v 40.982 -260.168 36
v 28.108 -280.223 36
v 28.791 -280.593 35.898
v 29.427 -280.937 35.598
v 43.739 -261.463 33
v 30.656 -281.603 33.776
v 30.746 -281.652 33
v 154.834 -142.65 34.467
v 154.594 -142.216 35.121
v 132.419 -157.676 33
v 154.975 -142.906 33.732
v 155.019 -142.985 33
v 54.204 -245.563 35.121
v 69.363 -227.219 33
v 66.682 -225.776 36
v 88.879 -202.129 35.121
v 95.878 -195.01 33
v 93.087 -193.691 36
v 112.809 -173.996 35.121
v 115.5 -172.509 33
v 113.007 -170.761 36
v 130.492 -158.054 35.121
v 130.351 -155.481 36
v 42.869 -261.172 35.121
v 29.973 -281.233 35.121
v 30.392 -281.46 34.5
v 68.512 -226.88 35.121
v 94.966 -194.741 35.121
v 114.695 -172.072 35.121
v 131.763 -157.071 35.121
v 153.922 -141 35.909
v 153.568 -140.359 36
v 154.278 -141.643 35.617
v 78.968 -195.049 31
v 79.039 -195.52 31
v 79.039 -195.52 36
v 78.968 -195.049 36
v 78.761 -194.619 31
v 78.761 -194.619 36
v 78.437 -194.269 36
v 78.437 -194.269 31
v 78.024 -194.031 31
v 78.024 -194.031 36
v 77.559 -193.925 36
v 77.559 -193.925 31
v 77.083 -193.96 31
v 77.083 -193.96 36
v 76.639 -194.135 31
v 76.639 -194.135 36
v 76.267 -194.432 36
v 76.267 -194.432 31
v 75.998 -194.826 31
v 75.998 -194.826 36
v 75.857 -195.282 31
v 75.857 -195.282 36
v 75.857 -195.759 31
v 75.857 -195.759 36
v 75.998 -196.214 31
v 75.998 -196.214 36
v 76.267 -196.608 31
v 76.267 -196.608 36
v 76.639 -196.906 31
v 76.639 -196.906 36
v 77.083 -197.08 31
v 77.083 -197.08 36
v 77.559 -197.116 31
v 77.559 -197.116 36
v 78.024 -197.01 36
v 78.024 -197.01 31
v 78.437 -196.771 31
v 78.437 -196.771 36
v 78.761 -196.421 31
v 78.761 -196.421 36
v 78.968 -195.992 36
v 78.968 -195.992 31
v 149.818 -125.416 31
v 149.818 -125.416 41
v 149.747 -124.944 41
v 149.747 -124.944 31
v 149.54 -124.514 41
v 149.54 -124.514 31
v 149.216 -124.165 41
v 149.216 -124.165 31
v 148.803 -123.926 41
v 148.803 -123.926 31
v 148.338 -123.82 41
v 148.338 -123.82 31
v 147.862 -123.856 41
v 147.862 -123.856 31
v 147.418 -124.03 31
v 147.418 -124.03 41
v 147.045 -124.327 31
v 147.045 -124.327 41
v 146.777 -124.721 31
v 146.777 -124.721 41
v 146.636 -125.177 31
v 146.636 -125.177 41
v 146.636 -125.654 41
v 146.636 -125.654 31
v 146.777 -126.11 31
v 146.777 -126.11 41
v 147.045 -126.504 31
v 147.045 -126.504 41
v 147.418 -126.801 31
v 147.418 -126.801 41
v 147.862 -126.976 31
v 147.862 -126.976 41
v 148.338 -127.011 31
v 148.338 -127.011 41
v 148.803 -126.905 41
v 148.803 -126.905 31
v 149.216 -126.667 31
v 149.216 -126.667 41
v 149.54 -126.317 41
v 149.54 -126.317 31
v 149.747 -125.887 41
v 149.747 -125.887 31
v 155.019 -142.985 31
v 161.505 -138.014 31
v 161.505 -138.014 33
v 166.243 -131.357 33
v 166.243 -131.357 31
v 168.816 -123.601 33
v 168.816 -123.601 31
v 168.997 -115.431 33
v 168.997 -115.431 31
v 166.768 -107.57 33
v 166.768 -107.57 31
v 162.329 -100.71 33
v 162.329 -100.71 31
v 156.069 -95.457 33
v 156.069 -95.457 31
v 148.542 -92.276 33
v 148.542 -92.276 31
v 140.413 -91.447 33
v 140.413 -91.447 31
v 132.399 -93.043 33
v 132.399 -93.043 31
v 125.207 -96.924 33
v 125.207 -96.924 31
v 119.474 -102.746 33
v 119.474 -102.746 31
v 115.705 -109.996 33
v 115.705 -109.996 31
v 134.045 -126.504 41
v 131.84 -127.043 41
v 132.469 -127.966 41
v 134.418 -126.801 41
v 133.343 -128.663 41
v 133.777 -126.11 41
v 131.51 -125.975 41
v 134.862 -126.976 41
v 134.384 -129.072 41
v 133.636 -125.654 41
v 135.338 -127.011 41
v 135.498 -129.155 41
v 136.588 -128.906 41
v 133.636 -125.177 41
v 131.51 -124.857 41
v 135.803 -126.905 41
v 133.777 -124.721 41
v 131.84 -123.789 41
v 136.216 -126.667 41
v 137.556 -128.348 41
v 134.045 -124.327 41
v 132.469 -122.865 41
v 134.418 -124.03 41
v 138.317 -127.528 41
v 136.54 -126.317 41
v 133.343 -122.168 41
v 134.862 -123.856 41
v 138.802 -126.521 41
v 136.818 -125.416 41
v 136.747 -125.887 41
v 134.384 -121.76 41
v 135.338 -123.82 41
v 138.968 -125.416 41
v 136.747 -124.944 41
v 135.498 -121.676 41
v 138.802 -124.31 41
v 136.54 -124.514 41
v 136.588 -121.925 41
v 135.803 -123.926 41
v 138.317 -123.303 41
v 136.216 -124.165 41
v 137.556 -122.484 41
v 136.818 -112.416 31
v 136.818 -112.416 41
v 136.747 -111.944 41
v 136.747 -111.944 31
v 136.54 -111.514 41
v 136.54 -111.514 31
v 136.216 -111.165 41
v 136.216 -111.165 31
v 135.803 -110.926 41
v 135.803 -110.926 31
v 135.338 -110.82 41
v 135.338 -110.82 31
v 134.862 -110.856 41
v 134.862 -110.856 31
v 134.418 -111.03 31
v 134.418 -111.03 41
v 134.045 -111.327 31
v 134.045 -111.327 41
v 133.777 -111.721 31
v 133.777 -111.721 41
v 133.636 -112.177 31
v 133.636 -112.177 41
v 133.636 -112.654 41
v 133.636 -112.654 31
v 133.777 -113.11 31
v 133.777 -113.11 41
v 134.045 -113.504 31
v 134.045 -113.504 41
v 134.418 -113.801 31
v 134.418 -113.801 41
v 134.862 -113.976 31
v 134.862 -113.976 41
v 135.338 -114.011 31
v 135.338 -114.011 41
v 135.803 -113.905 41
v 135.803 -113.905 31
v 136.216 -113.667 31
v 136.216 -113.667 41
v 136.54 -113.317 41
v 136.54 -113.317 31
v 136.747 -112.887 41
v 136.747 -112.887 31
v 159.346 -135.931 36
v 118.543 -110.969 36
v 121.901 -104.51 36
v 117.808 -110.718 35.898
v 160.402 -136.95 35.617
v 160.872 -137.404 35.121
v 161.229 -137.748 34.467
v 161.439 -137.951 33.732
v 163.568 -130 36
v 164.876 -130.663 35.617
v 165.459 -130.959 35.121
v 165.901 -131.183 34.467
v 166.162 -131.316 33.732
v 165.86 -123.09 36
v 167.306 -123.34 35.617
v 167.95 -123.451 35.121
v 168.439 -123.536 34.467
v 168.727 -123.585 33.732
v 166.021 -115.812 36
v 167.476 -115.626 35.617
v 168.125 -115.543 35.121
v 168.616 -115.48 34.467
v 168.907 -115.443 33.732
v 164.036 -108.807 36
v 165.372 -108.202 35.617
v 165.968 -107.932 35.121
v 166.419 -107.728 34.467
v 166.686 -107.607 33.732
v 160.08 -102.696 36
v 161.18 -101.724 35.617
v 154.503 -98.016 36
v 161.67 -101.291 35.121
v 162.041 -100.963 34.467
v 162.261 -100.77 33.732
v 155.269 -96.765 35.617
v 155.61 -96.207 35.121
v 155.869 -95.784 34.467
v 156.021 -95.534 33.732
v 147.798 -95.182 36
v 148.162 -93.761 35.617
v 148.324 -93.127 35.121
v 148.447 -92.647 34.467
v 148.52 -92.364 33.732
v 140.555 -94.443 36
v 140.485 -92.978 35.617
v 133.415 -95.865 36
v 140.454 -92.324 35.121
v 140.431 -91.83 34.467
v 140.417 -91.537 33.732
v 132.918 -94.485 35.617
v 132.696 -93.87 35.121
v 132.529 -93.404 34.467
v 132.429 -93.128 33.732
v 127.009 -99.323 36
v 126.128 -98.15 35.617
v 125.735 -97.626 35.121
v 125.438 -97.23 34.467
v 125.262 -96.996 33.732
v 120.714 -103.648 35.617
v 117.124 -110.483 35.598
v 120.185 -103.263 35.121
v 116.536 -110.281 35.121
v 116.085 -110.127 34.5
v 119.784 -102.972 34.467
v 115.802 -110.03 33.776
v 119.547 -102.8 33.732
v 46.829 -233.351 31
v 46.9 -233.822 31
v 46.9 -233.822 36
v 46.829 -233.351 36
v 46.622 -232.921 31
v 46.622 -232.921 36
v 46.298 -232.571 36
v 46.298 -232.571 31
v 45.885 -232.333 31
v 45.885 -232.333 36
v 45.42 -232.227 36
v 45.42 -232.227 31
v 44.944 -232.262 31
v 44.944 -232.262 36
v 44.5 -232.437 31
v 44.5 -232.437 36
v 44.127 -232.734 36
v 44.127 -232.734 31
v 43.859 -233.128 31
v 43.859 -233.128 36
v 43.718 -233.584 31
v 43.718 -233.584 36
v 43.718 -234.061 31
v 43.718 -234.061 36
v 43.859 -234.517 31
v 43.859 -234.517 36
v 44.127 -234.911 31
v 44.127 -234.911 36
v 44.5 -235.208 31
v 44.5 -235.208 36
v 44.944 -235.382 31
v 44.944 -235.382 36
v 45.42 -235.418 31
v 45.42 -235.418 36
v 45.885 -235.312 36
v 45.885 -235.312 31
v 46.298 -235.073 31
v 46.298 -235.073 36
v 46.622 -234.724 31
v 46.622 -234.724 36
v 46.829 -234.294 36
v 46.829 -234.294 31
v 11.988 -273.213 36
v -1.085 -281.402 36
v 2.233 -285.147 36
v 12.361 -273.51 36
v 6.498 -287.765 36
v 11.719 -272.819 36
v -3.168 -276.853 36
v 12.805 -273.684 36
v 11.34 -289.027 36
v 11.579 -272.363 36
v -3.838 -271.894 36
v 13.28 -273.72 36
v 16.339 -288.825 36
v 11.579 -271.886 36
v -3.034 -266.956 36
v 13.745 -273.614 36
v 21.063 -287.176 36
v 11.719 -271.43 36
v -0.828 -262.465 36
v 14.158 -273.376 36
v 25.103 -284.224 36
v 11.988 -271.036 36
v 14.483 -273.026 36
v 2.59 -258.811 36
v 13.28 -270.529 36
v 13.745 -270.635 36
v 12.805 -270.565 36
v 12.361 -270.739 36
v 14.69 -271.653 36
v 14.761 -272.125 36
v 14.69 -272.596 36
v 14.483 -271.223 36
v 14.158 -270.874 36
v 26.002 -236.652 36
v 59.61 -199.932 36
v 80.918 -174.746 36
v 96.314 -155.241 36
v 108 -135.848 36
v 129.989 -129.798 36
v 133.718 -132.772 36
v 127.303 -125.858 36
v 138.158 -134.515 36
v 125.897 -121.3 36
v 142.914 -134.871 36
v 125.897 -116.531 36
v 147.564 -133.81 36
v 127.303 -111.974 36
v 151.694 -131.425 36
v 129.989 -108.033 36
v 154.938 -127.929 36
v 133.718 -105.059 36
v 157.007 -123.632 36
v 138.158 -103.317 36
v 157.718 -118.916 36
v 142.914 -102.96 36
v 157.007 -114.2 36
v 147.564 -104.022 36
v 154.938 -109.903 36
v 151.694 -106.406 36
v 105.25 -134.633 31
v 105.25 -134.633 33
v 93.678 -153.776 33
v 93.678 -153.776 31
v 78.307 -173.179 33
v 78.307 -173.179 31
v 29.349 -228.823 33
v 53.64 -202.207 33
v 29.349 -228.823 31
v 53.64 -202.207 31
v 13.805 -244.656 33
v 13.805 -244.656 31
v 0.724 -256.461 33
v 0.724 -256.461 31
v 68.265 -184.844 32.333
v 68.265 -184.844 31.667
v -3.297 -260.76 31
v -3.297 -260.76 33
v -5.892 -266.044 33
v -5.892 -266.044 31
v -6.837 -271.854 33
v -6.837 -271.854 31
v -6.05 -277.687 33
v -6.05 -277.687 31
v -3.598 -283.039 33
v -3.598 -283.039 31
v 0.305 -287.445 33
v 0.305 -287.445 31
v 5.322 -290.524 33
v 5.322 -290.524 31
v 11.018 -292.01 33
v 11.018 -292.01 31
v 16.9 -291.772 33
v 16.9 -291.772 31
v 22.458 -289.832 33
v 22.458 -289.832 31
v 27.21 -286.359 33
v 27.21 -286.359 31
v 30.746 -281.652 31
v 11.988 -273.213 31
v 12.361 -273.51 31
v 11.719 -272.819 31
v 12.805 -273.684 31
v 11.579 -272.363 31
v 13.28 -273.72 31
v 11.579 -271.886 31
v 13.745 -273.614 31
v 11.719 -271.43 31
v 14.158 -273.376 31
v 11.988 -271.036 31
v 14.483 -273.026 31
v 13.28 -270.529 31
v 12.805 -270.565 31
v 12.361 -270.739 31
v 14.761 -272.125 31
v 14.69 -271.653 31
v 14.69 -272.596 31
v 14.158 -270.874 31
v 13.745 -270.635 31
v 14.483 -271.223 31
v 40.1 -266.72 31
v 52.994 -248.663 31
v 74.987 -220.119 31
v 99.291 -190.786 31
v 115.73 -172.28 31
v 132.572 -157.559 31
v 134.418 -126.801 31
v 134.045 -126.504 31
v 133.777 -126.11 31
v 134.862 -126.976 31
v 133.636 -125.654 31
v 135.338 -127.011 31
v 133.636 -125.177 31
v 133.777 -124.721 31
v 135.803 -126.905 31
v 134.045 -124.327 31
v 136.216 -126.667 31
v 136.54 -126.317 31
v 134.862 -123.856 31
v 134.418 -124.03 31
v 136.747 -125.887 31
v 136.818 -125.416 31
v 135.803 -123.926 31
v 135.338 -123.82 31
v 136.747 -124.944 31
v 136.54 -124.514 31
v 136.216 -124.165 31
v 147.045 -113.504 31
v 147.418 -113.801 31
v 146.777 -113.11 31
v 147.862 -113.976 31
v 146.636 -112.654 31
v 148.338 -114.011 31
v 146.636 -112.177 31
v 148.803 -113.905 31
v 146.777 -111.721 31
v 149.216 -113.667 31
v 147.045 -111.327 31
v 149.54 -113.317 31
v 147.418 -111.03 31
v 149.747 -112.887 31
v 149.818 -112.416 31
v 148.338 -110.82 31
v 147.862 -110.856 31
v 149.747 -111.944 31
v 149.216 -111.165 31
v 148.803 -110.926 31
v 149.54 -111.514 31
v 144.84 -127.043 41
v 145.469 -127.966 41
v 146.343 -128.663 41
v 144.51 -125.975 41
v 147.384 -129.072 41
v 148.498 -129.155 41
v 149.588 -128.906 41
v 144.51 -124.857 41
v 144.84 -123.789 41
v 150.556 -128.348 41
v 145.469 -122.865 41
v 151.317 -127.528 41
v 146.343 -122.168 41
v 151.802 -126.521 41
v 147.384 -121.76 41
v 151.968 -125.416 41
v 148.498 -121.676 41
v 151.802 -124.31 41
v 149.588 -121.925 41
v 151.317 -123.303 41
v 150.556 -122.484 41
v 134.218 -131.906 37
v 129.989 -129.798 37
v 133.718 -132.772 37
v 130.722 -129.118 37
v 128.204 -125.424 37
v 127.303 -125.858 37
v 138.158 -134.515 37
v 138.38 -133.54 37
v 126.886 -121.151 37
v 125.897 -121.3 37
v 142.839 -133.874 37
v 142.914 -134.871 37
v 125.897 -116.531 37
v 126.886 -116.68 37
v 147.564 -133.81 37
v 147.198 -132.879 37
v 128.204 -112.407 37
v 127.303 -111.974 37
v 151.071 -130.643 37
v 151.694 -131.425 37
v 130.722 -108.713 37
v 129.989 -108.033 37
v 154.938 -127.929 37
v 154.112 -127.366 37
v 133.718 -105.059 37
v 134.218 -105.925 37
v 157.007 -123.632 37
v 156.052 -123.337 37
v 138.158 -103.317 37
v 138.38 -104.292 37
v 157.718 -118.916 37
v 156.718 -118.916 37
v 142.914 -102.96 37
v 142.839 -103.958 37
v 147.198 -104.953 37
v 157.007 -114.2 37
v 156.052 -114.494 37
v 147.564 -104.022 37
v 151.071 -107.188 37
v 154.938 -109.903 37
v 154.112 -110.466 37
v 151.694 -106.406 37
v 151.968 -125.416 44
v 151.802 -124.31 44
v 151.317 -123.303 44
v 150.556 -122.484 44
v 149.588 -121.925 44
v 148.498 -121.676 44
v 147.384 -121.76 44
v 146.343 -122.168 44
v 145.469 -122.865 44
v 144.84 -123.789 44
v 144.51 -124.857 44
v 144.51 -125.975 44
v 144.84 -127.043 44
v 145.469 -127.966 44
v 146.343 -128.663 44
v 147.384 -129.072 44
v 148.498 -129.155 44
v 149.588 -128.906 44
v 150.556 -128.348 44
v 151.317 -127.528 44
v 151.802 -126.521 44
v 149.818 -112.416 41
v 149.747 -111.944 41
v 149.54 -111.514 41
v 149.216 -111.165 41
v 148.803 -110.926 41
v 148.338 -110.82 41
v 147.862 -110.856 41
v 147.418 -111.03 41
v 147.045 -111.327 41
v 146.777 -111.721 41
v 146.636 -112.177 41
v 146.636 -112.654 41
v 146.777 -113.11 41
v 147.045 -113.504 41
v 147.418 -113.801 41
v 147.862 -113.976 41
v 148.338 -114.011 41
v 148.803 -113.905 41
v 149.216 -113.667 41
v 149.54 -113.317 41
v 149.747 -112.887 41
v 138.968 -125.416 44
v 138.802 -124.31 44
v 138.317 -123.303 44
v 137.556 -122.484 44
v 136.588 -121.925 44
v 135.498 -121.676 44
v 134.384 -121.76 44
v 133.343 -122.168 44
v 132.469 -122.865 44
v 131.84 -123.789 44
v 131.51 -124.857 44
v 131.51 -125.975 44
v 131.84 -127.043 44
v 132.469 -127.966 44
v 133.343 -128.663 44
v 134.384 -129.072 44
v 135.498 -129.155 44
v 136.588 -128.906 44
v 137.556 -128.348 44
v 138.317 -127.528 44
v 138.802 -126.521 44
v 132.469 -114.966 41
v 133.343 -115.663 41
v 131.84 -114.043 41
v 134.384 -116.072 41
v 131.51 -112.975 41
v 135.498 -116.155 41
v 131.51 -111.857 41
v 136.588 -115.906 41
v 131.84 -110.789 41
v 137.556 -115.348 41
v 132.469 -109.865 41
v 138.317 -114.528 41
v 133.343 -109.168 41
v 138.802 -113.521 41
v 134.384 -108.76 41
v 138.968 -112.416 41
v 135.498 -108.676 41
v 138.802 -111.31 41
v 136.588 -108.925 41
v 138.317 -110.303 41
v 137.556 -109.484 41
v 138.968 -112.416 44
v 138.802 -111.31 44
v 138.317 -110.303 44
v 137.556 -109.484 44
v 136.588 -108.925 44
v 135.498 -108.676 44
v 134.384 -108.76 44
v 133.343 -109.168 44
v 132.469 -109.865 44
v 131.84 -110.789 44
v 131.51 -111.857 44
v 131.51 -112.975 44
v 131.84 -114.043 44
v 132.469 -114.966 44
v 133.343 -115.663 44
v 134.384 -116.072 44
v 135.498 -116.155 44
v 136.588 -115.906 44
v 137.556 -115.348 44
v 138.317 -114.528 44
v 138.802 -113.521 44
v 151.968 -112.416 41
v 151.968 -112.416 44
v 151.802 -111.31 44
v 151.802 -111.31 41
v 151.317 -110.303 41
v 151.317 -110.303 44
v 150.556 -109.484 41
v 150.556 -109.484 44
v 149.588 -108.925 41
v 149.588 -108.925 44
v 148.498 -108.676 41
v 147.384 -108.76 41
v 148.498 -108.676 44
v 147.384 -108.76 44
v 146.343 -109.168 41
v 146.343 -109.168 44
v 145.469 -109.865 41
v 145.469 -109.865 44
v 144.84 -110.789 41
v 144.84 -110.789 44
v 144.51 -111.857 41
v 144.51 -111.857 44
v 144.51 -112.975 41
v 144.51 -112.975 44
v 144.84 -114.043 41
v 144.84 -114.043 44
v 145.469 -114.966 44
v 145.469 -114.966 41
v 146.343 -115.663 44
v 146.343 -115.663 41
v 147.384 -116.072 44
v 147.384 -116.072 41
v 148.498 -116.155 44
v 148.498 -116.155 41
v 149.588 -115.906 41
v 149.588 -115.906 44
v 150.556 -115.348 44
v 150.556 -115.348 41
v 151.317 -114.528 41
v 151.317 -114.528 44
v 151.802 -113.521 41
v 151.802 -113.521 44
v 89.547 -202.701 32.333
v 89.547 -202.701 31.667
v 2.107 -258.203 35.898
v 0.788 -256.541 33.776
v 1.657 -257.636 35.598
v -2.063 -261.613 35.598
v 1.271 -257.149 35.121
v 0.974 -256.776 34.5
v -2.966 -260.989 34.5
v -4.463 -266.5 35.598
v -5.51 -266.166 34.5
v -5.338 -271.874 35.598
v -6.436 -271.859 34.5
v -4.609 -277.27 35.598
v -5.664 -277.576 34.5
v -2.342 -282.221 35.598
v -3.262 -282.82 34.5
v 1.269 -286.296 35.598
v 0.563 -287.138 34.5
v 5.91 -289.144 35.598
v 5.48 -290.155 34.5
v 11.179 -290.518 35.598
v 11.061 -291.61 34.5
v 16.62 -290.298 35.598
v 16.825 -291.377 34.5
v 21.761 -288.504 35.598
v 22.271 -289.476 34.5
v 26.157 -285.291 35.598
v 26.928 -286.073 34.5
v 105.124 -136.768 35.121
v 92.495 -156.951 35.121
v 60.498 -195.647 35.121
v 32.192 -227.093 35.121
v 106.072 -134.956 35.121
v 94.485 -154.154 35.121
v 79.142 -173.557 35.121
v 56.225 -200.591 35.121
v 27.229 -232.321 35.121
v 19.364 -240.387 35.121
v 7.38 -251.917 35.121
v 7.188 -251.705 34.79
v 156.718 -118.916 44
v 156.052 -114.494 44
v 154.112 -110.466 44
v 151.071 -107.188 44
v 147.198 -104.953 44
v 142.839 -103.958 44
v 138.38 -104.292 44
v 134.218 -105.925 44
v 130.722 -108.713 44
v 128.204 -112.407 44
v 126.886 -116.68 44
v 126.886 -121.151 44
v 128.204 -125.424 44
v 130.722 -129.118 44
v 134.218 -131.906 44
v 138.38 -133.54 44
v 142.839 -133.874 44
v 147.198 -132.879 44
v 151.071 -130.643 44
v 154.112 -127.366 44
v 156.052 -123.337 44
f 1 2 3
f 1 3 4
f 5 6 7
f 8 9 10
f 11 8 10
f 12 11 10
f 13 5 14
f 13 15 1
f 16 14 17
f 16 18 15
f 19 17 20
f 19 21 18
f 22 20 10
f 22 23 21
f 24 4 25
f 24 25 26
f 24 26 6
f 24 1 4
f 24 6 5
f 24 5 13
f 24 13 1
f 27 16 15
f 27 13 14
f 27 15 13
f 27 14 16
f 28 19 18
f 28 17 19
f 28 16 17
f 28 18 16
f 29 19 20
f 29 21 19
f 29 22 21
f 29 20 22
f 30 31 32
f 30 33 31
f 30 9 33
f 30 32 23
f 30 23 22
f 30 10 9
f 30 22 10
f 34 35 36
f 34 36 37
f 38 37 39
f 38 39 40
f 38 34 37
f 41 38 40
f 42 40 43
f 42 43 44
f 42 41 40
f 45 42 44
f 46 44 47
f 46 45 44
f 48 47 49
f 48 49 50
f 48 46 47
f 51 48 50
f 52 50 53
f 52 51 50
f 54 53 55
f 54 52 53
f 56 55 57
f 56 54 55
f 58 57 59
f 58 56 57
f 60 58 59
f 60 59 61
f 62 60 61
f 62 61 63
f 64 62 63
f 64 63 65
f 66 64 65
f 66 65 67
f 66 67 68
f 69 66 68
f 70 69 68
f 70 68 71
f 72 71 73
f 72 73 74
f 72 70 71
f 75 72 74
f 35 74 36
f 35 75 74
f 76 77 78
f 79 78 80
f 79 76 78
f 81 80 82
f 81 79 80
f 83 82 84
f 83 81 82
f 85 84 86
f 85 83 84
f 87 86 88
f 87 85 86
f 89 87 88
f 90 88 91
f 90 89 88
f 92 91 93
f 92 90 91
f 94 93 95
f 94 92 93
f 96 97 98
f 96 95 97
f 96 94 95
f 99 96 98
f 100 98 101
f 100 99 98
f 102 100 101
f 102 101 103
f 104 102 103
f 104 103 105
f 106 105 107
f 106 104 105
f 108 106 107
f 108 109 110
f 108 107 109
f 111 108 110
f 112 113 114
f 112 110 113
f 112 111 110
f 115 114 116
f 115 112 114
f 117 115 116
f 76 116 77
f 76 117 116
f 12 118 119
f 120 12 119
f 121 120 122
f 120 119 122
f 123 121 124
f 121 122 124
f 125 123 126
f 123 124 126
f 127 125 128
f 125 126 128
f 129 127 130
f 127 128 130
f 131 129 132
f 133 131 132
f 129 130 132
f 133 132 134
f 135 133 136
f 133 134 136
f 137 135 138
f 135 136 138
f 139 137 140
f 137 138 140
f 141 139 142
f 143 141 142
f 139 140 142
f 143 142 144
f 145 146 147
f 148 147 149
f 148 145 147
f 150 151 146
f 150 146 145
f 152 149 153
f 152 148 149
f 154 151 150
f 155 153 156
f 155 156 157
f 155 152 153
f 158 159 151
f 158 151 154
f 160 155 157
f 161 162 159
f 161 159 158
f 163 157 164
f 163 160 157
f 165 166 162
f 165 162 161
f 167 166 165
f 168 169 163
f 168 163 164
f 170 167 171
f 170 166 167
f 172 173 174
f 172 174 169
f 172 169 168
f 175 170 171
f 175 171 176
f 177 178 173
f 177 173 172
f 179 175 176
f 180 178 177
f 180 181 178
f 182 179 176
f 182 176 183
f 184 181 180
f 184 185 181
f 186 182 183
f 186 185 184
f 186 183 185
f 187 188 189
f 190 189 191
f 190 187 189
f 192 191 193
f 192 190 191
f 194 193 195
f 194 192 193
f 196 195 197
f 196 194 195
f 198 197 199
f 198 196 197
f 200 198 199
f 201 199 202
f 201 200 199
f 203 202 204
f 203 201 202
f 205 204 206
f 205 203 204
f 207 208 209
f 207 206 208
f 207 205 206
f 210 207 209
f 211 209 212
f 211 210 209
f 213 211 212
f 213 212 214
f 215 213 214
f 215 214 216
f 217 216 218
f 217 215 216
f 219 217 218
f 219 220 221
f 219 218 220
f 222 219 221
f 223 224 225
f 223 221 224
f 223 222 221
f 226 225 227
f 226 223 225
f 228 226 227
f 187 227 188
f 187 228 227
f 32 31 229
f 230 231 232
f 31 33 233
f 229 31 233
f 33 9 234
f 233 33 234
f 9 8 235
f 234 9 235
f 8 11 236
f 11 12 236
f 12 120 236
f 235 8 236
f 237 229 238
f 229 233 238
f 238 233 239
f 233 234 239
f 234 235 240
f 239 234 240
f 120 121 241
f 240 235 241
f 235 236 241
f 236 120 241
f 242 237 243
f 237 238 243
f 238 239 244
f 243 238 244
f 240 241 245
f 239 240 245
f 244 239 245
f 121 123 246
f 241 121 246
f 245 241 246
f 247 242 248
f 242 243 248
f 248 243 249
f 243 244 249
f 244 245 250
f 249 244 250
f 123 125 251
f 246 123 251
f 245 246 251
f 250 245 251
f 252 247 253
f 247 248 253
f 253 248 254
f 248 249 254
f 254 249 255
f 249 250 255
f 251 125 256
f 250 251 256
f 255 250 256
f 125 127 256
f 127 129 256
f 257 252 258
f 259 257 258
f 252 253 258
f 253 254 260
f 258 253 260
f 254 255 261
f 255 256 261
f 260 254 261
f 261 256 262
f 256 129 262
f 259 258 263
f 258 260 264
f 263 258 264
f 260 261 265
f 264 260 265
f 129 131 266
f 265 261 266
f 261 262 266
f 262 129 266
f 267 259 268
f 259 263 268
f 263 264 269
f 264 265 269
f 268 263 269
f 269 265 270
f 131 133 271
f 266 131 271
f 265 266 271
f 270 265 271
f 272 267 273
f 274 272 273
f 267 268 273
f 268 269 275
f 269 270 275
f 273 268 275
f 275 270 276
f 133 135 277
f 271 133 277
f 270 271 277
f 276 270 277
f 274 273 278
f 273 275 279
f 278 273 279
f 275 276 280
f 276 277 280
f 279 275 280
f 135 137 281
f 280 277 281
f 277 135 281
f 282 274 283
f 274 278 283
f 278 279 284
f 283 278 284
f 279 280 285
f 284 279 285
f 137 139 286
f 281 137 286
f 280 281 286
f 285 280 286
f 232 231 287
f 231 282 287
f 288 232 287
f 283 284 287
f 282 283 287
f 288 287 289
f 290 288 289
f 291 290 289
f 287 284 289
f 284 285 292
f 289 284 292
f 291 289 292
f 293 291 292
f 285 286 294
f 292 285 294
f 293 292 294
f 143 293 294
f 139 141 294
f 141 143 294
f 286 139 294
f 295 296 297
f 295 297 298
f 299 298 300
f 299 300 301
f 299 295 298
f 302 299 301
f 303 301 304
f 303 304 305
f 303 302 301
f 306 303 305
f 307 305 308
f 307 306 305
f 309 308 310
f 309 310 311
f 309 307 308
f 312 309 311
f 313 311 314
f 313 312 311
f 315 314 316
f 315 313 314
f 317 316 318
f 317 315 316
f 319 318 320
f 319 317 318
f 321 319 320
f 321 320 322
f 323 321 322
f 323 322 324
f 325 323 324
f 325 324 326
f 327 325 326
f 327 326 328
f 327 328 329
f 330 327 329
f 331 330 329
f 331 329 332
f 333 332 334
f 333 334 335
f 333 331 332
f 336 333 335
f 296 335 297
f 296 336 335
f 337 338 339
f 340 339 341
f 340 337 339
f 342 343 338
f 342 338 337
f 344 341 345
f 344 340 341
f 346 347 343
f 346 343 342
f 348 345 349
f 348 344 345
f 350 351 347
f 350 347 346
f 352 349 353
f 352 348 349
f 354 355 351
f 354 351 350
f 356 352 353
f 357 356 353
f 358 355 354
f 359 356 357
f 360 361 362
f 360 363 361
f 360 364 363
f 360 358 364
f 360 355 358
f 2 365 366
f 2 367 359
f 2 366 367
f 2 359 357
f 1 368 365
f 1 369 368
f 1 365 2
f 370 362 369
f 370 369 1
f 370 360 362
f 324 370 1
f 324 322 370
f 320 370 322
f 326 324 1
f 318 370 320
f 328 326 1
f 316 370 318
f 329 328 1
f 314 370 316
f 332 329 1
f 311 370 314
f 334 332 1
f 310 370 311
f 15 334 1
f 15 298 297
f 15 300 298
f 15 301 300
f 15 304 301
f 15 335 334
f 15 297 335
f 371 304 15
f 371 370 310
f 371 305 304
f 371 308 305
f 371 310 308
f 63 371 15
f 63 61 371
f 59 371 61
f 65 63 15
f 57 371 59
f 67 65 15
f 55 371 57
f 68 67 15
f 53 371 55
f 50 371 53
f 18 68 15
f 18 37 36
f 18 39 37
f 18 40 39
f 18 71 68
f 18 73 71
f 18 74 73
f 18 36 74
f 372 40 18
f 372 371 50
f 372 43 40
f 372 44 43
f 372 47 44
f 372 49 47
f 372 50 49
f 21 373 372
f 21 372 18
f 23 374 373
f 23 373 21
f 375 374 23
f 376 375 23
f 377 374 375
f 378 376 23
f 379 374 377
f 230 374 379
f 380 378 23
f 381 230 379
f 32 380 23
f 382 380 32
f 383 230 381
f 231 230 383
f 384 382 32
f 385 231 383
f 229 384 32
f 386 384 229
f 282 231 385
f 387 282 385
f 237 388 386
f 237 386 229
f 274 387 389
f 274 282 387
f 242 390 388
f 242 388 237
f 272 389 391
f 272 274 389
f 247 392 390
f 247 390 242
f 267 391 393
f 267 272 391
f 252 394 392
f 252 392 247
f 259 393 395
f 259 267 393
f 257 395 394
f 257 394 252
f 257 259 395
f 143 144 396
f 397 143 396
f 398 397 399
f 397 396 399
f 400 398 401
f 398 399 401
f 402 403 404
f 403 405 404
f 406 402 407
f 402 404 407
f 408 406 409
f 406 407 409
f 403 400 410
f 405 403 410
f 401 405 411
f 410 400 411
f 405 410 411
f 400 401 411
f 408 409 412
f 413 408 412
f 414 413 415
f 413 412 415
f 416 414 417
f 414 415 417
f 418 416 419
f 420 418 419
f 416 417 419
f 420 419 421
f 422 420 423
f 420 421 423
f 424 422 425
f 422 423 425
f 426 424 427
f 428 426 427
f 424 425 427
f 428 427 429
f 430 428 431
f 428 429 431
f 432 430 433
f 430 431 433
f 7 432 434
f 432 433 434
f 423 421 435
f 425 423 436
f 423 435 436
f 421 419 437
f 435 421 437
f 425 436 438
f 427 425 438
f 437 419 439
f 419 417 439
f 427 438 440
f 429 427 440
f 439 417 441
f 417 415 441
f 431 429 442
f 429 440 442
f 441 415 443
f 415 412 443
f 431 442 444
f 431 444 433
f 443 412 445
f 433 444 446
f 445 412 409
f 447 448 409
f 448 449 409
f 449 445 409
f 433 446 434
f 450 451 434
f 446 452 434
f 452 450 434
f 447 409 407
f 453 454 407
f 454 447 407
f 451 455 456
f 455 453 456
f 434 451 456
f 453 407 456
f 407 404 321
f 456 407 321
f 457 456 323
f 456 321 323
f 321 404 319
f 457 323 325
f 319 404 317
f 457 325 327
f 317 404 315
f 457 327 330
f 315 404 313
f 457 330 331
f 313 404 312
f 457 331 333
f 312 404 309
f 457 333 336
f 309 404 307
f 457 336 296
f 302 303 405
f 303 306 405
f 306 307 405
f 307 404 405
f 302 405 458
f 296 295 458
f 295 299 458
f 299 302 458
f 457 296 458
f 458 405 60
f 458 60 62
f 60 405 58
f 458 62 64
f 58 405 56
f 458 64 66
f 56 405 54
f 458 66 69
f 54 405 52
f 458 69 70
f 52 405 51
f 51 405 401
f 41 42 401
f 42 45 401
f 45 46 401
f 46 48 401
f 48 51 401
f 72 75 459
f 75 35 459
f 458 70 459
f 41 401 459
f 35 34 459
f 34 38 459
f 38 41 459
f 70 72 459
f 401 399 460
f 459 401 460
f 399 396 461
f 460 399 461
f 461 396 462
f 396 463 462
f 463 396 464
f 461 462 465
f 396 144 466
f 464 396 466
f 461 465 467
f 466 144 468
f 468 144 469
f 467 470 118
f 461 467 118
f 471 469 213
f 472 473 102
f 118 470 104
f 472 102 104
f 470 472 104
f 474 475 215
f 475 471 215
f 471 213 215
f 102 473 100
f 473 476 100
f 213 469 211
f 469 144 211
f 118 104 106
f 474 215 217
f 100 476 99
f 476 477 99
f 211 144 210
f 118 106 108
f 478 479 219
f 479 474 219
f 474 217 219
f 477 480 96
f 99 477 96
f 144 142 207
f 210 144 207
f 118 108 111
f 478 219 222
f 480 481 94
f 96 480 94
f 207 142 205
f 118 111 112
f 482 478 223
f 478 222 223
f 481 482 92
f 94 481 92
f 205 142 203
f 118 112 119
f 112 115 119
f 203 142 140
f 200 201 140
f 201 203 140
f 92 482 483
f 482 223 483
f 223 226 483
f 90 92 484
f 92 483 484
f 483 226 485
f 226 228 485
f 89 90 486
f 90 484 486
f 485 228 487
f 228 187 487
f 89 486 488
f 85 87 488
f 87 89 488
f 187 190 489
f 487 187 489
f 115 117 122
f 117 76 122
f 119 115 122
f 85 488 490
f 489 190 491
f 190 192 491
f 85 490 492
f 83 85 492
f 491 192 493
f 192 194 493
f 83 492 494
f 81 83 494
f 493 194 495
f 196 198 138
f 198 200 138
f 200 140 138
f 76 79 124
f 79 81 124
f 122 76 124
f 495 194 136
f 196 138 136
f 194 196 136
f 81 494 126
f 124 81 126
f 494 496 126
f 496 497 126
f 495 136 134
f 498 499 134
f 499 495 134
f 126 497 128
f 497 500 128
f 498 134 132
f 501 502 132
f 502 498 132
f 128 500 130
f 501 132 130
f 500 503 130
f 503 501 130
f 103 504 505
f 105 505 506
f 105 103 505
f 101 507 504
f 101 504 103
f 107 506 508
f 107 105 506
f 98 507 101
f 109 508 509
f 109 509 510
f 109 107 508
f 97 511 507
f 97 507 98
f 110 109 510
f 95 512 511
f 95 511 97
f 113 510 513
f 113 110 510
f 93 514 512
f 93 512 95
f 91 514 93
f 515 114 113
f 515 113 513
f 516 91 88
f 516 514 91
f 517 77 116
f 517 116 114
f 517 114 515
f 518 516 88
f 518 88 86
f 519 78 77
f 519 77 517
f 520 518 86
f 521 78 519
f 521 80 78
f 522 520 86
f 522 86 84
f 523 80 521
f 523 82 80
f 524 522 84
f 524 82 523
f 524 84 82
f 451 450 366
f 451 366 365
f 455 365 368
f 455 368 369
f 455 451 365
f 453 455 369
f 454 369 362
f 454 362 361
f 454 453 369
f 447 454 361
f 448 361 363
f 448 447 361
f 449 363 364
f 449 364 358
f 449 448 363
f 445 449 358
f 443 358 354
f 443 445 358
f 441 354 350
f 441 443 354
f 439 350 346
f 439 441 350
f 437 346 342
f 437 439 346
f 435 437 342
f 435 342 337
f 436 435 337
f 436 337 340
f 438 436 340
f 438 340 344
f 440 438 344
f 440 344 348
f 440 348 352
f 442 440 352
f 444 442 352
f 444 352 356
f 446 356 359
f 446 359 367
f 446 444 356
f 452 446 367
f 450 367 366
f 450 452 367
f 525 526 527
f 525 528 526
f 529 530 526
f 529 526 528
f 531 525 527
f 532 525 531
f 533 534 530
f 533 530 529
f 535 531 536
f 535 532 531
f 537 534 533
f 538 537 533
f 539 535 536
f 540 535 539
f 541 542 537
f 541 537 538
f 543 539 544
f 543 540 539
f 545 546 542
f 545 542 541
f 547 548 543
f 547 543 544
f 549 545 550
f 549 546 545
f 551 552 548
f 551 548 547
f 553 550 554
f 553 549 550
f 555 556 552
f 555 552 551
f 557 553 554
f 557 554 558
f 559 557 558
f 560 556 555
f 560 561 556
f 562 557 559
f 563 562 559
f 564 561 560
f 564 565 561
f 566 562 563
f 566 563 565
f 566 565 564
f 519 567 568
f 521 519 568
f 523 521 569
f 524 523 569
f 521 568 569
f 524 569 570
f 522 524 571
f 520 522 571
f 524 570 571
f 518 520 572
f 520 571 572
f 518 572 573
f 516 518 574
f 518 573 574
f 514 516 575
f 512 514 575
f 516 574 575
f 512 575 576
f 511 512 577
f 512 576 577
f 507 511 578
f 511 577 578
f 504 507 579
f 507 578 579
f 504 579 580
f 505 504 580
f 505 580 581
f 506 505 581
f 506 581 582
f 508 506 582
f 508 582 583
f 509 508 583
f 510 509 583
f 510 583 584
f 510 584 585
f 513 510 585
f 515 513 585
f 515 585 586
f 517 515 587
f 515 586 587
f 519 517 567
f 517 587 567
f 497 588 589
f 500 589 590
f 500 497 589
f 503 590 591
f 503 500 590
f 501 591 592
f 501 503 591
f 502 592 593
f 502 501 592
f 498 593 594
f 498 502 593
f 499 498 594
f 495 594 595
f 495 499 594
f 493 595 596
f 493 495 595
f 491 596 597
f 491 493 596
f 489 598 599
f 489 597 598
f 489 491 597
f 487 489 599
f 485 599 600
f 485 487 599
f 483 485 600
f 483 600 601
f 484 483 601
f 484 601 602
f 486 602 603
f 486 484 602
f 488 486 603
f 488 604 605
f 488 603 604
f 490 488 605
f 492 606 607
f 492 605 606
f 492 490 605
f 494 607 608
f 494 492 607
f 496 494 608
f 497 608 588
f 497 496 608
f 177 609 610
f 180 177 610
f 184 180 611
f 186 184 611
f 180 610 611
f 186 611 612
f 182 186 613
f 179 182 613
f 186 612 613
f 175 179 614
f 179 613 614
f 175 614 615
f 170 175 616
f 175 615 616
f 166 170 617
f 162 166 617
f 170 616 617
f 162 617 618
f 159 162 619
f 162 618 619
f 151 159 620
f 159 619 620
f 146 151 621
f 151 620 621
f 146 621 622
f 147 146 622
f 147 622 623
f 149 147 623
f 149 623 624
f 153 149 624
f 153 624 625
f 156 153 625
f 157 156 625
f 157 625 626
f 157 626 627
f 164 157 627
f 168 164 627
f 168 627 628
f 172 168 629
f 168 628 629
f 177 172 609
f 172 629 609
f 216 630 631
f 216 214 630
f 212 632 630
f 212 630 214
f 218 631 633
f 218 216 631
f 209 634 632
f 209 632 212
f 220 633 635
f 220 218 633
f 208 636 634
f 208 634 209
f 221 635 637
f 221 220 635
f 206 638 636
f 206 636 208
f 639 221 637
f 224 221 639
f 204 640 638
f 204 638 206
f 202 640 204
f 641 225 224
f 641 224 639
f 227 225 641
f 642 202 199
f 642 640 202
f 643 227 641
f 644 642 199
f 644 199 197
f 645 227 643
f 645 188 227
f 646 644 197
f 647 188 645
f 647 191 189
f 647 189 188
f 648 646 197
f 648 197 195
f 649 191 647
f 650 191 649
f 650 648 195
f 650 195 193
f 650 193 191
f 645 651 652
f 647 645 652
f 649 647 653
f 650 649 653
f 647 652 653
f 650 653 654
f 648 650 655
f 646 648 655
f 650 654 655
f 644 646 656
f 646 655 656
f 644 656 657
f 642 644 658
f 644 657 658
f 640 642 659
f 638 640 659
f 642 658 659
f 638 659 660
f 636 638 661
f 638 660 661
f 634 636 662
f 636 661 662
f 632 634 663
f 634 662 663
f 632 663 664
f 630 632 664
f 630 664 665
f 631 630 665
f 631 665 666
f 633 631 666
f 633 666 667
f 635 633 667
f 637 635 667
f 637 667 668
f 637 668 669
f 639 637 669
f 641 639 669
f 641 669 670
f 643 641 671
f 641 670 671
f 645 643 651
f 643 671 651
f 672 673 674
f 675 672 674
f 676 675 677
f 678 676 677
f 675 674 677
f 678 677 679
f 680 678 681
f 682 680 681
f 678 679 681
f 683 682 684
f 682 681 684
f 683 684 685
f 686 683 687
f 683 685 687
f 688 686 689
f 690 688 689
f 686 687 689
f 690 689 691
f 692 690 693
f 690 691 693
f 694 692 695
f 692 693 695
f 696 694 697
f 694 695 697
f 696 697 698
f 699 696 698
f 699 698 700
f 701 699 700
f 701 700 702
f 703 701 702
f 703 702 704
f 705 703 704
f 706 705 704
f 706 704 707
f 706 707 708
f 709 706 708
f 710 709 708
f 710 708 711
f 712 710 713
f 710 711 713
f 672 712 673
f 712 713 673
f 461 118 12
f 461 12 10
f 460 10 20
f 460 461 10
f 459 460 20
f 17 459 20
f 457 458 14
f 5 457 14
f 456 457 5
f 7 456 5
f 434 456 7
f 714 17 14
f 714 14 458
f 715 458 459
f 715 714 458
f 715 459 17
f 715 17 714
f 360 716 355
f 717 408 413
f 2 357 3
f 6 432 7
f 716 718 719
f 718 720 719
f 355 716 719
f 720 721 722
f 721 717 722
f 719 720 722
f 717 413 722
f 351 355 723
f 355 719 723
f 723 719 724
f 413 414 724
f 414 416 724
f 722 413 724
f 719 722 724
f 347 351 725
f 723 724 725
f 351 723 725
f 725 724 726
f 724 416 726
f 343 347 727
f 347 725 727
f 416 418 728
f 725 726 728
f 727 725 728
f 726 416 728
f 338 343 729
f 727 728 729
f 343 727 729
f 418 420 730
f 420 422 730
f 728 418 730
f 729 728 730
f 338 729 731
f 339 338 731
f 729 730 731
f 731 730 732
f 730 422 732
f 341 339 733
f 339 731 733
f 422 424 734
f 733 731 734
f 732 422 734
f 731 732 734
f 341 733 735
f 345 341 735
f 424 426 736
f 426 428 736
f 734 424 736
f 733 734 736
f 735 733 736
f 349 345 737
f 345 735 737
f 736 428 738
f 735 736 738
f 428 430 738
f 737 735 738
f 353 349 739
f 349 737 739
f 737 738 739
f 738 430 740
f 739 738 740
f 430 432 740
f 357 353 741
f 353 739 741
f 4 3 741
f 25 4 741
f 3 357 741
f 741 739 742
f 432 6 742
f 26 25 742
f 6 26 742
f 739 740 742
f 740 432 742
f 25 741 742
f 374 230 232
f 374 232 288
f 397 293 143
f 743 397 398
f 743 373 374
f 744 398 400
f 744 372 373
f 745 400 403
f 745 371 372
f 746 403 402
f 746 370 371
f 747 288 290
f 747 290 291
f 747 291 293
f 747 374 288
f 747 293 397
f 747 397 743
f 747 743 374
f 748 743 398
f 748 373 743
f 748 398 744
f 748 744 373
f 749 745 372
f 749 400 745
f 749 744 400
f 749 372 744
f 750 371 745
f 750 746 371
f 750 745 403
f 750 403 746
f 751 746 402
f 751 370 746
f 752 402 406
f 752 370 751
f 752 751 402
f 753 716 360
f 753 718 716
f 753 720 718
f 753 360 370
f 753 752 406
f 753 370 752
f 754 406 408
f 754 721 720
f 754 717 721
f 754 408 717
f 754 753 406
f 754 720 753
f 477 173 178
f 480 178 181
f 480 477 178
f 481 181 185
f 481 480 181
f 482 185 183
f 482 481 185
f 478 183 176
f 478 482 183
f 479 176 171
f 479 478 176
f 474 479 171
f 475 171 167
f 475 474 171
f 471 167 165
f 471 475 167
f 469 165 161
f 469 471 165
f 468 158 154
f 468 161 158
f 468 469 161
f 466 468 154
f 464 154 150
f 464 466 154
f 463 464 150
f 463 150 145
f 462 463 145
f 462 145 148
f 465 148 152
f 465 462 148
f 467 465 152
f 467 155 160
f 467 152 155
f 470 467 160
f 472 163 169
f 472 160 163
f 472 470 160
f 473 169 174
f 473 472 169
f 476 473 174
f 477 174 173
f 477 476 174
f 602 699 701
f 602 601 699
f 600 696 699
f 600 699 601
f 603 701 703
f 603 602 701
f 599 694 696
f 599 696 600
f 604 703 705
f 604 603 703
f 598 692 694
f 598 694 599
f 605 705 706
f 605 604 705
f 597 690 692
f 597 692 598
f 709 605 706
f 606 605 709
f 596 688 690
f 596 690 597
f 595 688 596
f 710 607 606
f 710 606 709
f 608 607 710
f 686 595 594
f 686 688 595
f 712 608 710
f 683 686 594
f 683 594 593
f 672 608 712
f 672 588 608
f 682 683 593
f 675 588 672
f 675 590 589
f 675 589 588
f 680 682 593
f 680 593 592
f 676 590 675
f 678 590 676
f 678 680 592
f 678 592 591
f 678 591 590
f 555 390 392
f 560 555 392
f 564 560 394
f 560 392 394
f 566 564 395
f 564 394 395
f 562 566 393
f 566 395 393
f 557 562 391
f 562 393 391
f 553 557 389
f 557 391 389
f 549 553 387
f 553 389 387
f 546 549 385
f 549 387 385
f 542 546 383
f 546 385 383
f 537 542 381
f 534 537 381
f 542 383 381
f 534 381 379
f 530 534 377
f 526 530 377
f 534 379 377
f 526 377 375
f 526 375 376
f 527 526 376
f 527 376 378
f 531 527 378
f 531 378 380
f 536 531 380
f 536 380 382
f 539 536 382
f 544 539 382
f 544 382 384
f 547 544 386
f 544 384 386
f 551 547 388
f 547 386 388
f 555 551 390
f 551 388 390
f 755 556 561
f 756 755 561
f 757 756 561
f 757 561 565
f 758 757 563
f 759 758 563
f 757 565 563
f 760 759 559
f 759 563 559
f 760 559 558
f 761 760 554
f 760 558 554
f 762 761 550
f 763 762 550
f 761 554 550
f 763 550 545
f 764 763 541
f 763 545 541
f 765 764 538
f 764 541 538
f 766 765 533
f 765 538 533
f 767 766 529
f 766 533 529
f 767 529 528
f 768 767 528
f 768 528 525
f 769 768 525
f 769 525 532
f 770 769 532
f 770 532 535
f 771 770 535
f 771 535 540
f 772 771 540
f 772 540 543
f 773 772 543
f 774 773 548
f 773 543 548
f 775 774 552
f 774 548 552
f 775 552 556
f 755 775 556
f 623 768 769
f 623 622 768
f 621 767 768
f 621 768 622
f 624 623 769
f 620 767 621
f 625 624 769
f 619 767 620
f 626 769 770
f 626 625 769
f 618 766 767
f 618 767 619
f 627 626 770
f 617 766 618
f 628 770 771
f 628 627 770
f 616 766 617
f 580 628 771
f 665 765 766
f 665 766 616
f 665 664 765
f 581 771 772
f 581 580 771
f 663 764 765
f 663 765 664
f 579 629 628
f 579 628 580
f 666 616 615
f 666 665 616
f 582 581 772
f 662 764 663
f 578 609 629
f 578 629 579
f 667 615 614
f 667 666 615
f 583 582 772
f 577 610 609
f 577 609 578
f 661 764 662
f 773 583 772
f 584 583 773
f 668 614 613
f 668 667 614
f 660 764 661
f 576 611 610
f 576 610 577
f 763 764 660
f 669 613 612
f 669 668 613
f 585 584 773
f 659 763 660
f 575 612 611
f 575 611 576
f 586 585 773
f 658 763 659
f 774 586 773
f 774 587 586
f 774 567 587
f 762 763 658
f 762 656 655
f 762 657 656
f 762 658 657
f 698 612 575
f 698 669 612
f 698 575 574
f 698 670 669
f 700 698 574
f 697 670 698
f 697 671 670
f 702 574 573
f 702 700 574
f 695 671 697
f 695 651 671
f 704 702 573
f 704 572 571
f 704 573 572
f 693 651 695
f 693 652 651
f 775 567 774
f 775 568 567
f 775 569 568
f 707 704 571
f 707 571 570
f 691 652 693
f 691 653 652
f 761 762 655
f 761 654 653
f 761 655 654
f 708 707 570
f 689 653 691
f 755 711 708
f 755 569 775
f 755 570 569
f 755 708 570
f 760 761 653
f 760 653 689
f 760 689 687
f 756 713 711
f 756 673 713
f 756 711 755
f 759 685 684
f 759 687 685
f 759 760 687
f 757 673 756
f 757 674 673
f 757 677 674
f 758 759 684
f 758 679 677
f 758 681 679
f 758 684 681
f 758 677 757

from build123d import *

# Parameters (mm, degrees)
SKETCH1_R           = 1.6
BOSS_EXTRUDE1_DEPTH = 5
SKETCH2_R           = 16
SKETCH2_R_2         = 1.6
BOSS_EXTRUDE2_DEPTH = 1
SKETCH3_R           = 15
SKETCH3_R_2         = 1.6
BOSS_EXTRUDE3_DEPTH = 7
SKETCH4_R           = 3.75
CUT_EXTRUDE1_DEPTH  = 3
VARFILLET1_R        = 3


with BuildPart() as part:
    # Sketch1 → Boss-Extrude1 (new body)
    with BuildSketch(Plane.XY.offset(31)):
        with BuildLine():
            ThreePointArc((155.019115612, -142.985112199), (159.394881243, -97.849485606), (115.704809966, -109.996492831))
            add(Edge.make_bspline(
                [(115.704809966, -109.996492831), (101.94879758, -150.116707379), (78.178790791, -171.772825461), (58.717079478, -197.082387325), (16.356999542, -244.049515564), (0.72448619, -256.46124476)],
                knots=[0, 0, 0, 0, 0.619090324, 0.719090324, 1, 1, 1, 1], degree=3))
            ThreePointArc((0.72448619, -256.46124476), (0.304947846, -287.445485278), (30.74561606, -281.651963762))
            add(Edge.make_bspline(
                [(155.019115612, -142.985112199), (117.897123756, -163.498941991), (100.69762913, -190.668374405), (79.152067085, -214.229377889), (40.254225745, -264.101669257), (30.74561606, -281.651963762)],
                knots=[0, 0, 0, 0, 0.619090324, 0.719090324, 1, 1, 1, 1], degree=3))
        make_face()
        with Locations((135.218221977, -112.415707792)):
            Circle(SKETCH1_R, mode=Mode.SUBTRACT)
        with Locations((148.218221977, -112.415707792)):
            Circle(SKETCH1_R, mode=Mode.SUBTRACT)
        with Locations((148.218221977, -125.415707792)):
            Circle(SKETCH1_R, mode=Mode.SUBTRACT)
        with Locations((135.218221977, -125.415707792)):
            Circle(SKETCH1_R, mode=Mode.SUBTRACT)
        with Locations((77.439461008, -195.520152104)):
            Circle(SKETCH1_R, mode=Mode.SUBTRACT)
        with Locations((45.300080524, -233.82237426)):
            Circle(SKETCH1_R, mode=Mode.SUBTRACT)
        with Locations((13.16070004, -272.124596416)):
            Circle(SKETCH1_R, mode=Mode.SUBTRACT)
    extrude(amount=BOSS_EXTRUDE1_DEPTH)

    # Sketch2 → Boss-Extrude2 (add)
    with BuildSketch(Plane.XY.offset(36)):
        with Locations((141.718221977, -118.915707792)):
            Circle(SKETCH2_R)
        with Locations((148.218221977, -125.415707792)):
            Circle(SKETCH2_R_2, mode=Mode.SUBTRACT)
        with Locations((135.218221977, -125.415707792)):
            Circle(SKETCH2_R_2, mode=Mode.SUBTRACT)
        with Locations((135.218221977, -112.415707792)):
            Circle(SKETCH2_R_2, mode=Mode.SUBTRACT)
        with Locations((148.218221977, -112.415707792)):
            Circle(SKETCH2_R_2, mode=Mode.SUBTRACT)
    extrude(amount=BOSS_EXTRUDE2_DEPTH)

    # Sketch3 → Boss-Extrude3 (add)
    with BuildSketch(Plane.XY.offset(37)):
        with Locations((141.718221977, -118.915707792)):
            Circle(SKETCH3_R)
        with Locations((148.218221977, -125.415707792)):
            Circle(SKETCH3_R_2, mode=Mode.SUBTRACT)
        with Locations((135.218221977, -112.415707792)):
            Circle(SKETCH3_R_2, mode=Mode.SUBTRACT)
        with Locations((148.218221977, -112.415707792)):
            Circle(SKETCH3_R_2, mode=Mode.SUBTRACT)
        with Locations((135.218221977, -125.415707792)):
            Circle(SKETCH3_R_2, mode=Mode.SUBTRACT)
    extrude(amount=BOSS_EXTRUDE3_DEPTH)

    # Sketch4 → Cut-Extrude1 (cut)
    with BuildSketch(Plane.XY.offset(44)):
        with Locations((135.218221977, -112.415707792)):
            Circle(SKETCH4_R)
        with Locations((148.218221977, -112.415707792)):
            Circle(SKETCH4_R)
        with Locations((148.218221977, -125.415707792)):
            Circle(SKETCH4_R)
        with Locations((135.218221977, -125.415707792)):
            Circle(SKETCH4_R)
    extrude(amount=-CUT_EXTRUDE1_DEPTH, mode=Mode.SUBTRACT)

    # VarFillet1
    varfillet1_edges = [part.edges().sort_by_distance(p)[0] for p in [
        (0.304947846, -287.445485278, 36),
        (65.360846316, -188.427744165, 36),
        (86.521548764, -206.183681785, 36),
    ]]
    fillet(varfillet1_edges, radius=VARFILLET1_R)


solid = part.part
